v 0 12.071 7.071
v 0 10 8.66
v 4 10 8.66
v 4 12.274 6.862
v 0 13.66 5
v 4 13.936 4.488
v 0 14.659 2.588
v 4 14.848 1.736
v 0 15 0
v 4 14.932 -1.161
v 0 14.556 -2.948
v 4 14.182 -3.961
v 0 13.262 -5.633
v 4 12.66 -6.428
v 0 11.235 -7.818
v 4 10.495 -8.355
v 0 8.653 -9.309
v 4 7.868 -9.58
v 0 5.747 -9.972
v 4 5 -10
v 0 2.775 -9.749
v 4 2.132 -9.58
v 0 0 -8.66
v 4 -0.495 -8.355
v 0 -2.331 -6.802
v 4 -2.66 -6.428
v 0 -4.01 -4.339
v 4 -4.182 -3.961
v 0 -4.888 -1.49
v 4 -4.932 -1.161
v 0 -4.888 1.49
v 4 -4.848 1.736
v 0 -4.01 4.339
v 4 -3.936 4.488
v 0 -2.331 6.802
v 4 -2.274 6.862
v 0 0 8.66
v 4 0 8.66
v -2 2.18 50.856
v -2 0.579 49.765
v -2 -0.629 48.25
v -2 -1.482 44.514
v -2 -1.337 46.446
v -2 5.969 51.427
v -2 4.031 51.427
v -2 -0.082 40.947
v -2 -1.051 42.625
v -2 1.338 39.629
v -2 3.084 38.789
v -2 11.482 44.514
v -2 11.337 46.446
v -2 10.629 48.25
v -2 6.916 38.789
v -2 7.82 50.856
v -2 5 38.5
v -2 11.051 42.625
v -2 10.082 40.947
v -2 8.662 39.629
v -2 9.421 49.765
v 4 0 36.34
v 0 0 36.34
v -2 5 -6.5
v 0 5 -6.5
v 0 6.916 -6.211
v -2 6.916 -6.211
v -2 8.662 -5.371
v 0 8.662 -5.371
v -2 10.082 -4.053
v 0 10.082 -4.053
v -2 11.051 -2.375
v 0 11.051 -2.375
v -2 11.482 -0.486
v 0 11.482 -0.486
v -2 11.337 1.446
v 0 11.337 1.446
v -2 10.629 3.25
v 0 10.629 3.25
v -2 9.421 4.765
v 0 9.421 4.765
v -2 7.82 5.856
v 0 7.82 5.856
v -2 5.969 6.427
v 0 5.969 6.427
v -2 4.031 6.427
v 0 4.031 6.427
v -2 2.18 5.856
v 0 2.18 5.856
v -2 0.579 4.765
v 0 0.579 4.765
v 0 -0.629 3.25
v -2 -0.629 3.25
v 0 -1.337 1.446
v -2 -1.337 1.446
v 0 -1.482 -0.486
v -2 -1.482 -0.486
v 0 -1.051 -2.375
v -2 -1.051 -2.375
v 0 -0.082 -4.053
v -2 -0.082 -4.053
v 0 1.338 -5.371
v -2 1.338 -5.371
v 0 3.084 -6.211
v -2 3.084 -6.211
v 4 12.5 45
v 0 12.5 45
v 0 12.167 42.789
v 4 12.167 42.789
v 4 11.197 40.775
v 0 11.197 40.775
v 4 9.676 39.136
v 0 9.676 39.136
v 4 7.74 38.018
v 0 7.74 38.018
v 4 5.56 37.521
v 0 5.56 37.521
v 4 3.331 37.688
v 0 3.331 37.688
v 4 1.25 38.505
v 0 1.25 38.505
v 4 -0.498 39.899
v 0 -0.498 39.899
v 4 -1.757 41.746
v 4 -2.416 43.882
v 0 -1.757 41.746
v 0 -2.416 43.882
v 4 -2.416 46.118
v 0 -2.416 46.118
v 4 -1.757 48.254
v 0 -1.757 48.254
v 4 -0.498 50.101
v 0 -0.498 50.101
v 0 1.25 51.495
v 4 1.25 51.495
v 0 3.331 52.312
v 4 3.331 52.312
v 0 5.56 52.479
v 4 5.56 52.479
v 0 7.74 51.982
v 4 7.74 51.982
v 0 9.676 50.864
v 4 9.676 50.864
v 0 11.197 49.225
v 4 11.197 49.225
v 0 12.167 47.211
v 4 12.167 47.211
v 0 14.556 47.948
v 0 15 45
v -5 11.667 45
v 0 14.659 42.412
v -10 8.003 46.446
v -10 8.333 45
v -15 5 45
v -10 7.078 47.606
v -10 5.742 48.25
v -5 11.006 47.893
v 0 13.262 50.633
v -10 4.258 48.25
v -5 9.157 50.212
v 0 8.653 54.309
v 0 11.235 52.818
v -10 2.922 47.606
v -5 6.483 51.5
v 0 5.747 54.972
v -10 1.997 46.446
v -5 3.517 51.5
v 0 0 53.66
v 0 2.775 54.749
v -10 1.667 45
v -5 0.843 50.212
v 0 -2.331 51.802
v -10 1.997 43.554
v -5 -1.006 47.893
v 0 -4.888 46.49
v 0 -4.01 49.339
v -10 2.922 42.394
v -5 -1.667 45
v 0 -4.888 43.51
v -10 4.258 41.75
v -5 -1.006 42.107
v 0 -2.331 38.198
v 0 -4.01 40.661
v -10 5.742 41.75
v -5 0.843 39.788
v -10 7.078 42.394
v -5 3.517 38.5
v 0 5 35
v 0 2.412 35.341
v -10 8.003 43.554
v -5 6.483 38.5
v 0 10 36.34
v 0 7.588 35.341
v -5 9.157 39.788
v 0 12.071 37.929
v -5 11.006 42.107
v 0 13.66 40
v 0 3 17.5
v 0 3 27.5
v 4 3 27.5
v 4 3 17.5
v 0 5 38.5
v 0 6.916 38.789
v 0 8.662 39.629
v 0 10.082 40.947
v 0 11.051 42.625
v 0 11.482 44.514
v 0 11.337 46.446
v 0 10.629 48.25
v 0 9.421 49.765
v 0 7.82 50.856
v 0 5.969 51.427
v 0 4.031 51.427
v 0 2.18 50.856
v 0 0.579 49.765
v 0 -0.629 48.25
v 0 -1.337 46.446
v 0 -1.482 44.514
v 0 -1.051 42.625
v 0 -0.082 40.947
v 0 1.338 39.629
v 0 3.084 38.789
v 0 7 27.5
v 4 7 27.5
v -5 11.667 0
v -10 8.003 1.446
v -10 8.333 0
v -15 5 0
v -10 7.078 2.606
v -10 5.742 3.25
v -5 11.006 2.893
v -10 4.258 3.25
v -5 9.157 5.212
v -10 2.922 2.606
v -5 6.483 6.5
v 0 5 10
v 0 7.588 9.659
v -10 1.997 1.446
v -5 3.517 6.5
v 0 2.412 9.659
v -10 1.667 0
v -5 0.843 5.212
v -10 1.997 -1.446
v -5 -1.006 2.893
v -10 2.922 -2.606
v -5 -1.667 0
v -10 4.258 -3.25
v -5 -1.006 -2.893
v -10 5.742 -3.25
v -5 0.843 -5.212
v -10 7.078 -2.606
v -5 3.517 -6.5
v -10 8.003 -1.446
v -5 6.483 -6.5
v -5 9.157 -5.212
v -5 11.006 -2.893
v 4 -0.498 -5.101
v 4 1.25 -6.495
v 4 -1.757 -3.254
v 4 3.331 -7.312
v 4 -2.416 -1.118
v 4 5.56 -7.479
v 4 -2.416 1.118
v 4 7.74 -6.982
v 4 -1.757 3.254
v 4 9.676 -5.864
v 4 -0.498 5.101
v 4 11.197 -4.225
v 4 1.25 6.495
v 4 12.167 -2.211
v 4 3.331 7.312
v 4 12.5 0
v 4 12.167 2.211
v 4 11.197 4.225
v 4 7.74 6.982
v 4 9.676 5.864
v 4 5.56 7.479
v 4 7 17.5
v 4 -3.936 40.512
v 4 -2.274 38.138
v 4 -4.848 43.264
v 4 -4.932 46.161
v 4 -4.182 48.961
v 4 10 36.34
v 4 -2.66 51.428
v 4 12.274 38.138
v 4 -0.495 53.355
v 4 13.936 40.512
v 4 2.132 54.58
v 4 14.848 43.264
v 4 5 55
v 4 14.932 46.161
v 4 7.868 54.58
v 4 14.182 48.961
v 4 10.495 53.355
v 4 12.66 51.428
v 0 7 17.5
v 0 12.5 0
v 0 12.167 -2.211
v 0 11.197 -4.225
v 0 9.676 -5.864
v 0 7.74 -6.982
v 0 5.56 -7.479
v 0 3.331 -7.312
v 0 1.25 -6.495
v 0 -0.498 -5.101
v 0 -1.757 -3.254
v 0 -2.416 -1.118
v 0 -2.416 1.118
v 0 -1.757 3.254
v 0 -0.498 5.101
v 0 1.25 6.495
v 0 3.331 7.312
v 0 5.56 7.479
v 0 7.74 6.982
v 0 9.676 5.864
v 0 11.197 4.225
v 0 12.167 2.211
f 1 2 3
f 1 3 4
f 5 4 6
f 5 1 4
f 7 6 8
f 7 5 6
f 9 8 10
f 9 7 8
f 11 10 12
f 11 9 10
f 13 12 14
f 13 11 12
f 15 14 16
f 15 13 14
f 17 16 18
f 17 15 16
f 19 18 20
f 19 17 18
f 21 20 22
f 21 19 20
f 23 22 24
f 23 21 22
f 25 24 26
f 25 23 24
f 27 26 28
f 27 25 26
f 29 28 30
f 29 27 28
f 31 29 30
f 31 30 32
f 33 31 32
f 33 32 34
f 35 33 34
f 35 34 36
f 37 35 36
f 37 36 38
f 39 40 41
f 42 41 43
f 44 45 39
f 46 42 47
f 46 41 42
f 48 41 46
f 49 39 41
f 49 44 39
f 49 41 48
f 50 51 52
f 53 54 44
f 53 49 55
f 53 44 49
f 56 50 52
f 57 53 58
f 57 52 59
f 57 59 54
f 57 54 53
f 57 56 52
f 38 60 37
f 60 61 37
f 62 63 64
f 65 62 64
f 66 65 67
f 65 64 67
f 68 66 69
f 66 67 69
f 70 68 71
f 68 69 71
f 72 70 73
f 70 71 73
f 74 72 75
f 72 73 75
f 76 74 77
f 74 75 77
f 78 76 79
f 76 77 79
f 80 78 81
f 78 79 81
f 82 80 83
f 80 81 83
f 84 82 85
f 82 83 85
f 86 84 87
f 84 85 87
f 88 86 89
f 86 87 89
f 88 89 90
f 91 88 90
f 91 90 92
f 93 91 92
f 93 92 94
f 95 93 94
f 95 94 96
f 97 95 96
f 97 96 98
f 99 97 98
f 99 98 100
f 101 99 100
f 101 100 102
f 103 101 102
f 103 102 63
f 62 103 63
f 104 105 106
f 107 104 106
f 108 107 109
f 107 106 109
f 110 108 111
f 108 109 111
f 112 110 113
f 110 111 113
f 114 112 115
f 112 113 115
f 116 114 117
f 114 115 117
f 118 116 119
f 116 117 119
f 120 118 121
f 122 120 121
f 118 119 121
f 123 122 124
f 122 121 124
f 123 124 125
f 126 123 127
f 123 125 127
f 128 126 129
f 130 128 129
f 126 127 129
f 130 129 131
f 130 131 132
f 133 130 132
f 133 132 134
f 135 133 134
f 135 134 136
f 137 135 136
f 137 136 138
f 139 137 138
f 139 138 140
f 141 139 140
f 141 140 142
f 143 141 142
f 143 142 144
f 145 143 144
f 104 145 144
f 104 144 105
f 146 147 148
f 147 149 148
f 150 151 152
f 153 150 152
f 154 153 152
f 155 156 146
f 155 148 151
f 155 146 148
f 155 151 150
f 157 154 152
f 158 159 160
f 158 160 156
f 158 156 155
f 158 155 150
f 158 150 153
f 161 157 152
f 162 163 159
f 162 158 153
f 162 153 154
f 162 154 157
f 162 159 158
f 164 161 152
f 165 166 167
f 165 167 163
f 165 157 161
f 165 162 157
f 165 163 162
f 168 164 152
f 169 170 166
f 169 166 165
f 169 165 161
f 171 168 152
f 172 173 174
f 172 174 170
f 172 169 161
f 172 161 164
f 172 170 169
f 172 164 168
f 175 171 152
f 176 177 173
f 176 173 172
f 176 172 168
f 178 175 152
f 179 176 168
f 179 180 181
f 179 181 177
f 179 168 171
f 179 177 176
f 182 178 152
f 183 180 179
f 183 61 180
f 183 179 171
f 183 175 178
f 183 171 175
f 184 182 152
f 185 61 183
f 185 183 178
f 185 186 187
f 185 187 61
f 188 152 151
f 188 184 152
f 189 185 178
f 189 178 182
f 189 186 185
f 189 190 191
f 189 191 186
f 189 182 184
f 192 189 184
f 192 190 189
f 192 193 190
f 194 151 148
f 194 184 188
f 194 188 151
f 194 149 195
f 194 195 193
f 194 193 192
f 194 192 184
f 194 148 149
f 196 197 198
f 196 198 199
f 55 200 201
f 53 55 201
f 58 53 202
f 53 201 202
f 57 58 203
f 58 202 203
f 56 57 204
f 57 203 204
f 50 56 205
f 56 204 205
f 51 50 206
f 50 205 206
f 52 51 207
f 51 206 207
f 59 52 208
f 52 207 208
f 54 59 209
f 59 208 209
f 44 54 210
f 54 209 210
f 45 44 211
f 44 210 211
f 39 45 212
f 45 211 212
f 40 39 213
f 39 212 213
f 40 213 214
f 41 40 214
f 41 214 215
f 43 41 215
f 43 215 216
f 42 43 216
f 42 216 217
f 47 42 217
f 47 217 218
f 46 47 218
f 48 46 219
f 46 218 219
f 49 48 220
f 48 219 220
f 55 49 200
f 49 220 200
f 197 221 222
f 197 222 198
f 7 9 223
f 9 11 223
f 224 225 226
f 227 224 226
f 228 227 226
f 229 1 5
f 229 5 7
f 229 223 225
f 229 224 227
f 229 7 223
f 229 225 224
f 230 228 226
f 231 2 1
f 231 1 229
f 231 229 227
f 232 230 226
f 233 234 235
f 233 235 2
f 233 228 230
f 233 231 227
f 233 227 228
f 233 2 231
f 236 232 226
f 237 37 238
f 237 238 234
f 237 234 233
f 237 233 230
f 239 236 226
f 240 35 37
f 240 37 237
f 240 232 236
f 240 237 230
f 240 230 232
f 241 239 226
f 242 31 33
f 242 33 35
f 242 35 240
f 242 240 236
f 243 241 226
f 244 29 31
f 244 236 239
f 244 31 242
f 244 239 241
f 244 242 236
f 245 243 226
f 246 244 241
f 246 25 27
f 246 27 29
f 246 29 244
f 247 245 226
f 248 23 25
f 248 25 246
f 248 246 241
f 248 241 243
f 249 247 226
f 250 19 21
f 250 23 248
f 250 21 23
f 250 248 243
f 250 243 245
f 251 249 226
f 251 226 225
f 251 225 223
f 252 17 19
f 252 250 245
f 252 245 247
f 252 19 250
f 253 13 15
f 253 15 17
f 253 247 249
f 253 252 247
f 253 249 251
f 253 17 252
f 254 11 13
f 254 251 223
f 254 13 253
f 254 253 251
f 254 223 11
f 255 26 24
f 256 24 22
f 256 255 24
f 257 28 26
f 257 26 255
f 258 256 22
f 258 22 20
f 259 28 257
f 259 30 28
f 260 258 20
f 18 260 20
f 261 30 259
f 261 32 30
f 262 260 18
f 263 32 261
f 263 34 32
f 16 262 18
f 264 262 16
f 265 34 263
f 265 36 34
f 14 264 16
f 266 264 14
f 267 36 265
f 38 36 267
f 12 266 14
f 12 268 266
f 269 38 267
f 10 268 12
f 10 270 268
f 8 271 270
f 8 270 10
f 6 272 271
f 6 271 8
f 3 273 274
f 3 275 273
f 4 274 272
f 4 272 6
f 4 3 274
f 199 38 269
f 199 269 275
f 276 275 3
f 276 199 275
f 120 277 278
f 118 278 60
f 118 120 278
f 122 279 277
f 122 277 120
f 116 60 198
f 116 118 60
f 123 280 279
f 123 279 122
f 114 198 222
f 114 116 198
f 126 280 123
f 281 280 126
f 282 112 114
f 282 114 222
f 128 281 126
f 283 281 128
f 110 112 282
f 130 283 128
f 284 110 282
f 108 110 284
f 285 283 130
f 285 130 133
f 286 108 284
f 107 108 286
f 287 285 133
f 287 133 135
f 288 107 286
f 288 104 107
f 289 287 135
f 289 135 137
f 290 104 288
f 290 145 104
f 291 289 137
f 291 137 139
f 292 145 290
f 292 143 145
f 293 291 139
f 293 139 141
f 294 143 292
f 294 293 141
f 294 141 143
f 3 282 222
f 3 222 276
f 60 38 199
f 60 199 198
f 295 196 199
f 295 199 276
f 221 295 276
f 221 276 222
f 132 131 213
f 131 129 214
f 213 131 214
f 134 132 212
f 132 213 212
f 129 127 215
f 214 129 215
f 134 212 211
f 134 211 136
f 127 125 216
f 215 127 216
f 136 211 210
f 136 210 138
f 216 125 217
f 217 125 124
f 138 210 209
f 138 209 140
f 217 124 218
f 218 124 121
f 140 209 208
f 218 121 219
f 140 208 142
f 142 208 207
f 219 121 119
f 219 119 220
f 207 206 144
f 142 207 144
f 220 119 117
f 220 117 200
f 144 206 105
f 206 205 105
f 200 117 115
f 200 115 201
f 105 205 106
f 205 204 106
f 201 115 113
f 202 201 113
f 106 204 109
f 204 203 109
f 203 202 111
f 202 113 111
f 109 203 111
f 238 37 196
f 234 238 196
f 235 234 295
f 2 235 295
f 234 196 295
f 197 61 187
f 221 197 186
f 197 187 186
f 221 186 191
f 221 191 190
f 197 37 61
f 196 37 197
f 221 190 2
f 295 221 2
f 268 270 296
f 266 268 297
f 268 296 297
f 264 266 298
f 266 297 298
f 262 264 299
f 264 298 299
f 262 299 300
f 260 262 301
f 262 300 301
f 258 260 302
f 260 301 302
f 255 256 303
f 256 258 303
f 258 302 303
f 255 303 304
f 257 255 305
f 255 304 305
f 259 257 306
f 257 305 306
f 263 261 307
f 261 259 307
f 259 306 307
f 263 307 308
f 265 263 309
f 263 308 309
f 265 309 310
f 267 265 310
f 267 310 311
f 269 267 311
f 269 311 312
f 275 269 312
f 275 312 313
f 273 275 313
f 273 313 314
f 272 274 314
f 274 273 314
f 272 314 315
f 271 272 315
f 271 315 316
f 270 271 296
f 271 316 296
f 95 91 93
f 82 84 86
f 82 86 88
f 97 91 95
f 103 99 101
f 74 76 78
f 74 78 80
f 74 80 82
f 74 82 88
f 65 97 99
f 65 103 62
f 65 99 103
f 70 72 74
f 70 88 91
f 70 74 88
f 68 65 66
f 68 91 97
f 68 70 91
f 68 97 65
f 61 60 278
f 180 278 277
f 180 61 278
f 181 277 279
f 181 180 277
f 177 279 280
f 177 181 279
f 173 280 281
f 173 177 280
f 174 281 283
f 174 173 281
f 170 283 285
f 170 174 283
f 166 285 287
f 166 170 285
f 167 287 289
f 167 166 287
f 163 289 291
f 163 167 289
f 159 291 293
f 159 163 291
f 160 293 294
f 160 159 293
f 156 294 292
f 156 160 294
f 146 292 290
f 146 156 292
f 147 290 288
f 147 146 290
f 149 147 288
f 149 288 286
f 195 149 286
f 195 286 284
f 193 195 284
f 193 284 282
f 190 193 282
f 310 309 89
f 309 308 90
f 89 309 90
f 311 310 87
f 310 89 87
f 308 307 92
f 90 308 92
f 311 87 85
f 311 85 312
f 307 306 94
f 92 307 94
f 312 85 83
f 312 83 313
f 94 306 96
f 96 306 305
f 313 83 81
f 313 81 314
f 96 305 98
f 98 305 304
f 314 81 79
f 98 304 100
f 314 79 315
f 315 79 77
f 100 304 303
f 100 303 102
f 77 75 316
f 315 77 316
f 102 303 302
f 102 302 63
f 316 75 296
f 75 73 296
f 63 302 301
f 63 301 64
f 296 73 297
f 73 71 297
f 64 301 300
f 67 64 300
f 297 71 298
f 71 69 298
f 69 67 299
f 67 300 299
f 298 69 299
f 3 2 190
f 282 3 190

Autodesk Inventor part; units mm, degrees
ref_plane "YZ Plane" through (0, 0, 0) normal (1, 0, 0) x (0, 1, 0)
sketch "Эскиз1" plane through (0, 0, 0) normal (1, 0, 0) x (0, 1, 0)
  line L0 (0, 0) -> (10, 0)
  line L1 (10, 0) -> (10, 45)
  line L2 (10, 45) -> (0, 45)
  line L3 (0, 45) -> (0, 0)
  arc A0 (10, 45) -> (0, 45) centre (5, 45) ccw
  arc A1 (0, 0) -> (10, 0) centre (5, 0) ccw
  circle A2 centre (5, 45) radius 7.5
  circle A3 centre (5, 0) radius 7.5
  line L4 (0, 22.5) -> (10, 22.5)
  line L5 (0, 27.5) -> (-20, 27.5)
  line L6 (-20, 27.5) -> (-20, 17.5)
  line L7 (-20, 17.5) -> (0, 17.5)
  line L8 (0, 17.5) -> (0, 27.5)
  line L9 (7, 27.5) -> (3, 27.5)
  line L10 (3, 27.5) -> (3, 17.5)
  line L11 (3, 17.5) -> (7, 17.5)
  line L12 (7, 17.5) -> (7, 27.5)
  circle A4 centre (5, 45) radius 10
  circle A5 centre (5, 0) radius 10
  point P0 (0, 17.5)
  point P1 (0, 8.6603)
  point P2 (10, 8.6603)
  point P3 (10, 5.5902)
  point P4 (0, 5.5902)
  point P5 (10, 36.3397)
  point P6 (0, 36.3397)
  point P7 (0, 39.4098)
  point P8 (10, 39.4098)
  dimension "d0" = 45
  dimension "d1" = 10
  dimension "d2" = 15
  dimension "d3" = 15
  dimension "d6" = 10
  dimension "d7" = 20
  dimension "d8" = 10
  dimension "d9" = 20
  dimension "d10" = 20
extrude "Выдавливание1" add sketch "Эскиз1" along normal blind 4 contours A3 L1 A5 L3 | L3 A5 L1 A3 | L3 L4 L10 L11 L12 L1 A5 | L4 L12 L9 L10 L3 A4 L1 | A4 L3 A2 L1 | L1 A2 L3 A4
sketch "Эскиз3" plane through (0, 0, 0) normal (-1, 0, 0) x (0, 0, 1)
  arc A0 (8.6603, 10) -> (8.6603, 0) centre (0, 5) ccw projected
  line L0 (0, -5) -> (0, 15)
  arc A1 (36.3397, 0) -> (36.3397, 10) centre (45, 5) ccw projected
  line L1 (45, -5) -> (45, 15)
  point P0 (0, 0)
ref_plane "РабПлоскость1" through (0, -5, 0) normal (0, 0, -1) x (0, 1, 0)
ref_plane "РабПлоскость2" through (0, -5, 45) normal (0, 0, -1) x (0, 1, 0)
sketch "Эскиз4" plane through (0, -5, 0) normal (0, 0, -1) x (0, 1, 0)
  line L0 (20, 0) -> (0, 0) projected
  line L1 (10, 0) -> (10, -15)
  line L2 (10, -15) -> (20, 0)
  point P0 (5, 0)
  point P1 (15, 0)
  dimension "d15" = 15
revolve "Вращение1" add sketch "Эскиз4" angle 360 about axis through (0, 5, 0) along (-1, 0, 0)
sketch "Эскиз5" plane through (0, -5, 45) normal (0, 0, -1) x (0, 1, 0)
  line L0 (20, 0) -> (10, -15) projected
  line L1 (20, 0) -> (10, -15)
  line L2 (15, 0) -> (5, 0) projected
  line L3 (10, 0) -> (10, -15)
  line L4 (20, 0) -> (0, 0) projected
  line L5 (10, 0) -> (20, 0)
revolve "Вращение2" add sketch "Эскиз5" angle 360 about axis through (0, 5, 45) along (-1, 0, 0)
sketch "Эскиз6" plane through (0, 5, 0) normal (1, 0, 0) x (0, 0, -1)
  arc A0 (-8.6603, -5) -> (-8.6603, 5) centre (0, 0) ccw projected
  circle A1 centre (0, 0) radius 6.5
  circle A2 centre (-45, 0) radius 7.5 projected
  circle A3 centre (-45, 0) radius 6.5
  point P0 (0, -5)
  dimension "d18" = 13
  dimension "d19" = 13
extrude "Выдавливание3" cut sketch "Эскиз6" against normal blind 2 contours A1 | A3
properties part number "соединение пушек перед"
